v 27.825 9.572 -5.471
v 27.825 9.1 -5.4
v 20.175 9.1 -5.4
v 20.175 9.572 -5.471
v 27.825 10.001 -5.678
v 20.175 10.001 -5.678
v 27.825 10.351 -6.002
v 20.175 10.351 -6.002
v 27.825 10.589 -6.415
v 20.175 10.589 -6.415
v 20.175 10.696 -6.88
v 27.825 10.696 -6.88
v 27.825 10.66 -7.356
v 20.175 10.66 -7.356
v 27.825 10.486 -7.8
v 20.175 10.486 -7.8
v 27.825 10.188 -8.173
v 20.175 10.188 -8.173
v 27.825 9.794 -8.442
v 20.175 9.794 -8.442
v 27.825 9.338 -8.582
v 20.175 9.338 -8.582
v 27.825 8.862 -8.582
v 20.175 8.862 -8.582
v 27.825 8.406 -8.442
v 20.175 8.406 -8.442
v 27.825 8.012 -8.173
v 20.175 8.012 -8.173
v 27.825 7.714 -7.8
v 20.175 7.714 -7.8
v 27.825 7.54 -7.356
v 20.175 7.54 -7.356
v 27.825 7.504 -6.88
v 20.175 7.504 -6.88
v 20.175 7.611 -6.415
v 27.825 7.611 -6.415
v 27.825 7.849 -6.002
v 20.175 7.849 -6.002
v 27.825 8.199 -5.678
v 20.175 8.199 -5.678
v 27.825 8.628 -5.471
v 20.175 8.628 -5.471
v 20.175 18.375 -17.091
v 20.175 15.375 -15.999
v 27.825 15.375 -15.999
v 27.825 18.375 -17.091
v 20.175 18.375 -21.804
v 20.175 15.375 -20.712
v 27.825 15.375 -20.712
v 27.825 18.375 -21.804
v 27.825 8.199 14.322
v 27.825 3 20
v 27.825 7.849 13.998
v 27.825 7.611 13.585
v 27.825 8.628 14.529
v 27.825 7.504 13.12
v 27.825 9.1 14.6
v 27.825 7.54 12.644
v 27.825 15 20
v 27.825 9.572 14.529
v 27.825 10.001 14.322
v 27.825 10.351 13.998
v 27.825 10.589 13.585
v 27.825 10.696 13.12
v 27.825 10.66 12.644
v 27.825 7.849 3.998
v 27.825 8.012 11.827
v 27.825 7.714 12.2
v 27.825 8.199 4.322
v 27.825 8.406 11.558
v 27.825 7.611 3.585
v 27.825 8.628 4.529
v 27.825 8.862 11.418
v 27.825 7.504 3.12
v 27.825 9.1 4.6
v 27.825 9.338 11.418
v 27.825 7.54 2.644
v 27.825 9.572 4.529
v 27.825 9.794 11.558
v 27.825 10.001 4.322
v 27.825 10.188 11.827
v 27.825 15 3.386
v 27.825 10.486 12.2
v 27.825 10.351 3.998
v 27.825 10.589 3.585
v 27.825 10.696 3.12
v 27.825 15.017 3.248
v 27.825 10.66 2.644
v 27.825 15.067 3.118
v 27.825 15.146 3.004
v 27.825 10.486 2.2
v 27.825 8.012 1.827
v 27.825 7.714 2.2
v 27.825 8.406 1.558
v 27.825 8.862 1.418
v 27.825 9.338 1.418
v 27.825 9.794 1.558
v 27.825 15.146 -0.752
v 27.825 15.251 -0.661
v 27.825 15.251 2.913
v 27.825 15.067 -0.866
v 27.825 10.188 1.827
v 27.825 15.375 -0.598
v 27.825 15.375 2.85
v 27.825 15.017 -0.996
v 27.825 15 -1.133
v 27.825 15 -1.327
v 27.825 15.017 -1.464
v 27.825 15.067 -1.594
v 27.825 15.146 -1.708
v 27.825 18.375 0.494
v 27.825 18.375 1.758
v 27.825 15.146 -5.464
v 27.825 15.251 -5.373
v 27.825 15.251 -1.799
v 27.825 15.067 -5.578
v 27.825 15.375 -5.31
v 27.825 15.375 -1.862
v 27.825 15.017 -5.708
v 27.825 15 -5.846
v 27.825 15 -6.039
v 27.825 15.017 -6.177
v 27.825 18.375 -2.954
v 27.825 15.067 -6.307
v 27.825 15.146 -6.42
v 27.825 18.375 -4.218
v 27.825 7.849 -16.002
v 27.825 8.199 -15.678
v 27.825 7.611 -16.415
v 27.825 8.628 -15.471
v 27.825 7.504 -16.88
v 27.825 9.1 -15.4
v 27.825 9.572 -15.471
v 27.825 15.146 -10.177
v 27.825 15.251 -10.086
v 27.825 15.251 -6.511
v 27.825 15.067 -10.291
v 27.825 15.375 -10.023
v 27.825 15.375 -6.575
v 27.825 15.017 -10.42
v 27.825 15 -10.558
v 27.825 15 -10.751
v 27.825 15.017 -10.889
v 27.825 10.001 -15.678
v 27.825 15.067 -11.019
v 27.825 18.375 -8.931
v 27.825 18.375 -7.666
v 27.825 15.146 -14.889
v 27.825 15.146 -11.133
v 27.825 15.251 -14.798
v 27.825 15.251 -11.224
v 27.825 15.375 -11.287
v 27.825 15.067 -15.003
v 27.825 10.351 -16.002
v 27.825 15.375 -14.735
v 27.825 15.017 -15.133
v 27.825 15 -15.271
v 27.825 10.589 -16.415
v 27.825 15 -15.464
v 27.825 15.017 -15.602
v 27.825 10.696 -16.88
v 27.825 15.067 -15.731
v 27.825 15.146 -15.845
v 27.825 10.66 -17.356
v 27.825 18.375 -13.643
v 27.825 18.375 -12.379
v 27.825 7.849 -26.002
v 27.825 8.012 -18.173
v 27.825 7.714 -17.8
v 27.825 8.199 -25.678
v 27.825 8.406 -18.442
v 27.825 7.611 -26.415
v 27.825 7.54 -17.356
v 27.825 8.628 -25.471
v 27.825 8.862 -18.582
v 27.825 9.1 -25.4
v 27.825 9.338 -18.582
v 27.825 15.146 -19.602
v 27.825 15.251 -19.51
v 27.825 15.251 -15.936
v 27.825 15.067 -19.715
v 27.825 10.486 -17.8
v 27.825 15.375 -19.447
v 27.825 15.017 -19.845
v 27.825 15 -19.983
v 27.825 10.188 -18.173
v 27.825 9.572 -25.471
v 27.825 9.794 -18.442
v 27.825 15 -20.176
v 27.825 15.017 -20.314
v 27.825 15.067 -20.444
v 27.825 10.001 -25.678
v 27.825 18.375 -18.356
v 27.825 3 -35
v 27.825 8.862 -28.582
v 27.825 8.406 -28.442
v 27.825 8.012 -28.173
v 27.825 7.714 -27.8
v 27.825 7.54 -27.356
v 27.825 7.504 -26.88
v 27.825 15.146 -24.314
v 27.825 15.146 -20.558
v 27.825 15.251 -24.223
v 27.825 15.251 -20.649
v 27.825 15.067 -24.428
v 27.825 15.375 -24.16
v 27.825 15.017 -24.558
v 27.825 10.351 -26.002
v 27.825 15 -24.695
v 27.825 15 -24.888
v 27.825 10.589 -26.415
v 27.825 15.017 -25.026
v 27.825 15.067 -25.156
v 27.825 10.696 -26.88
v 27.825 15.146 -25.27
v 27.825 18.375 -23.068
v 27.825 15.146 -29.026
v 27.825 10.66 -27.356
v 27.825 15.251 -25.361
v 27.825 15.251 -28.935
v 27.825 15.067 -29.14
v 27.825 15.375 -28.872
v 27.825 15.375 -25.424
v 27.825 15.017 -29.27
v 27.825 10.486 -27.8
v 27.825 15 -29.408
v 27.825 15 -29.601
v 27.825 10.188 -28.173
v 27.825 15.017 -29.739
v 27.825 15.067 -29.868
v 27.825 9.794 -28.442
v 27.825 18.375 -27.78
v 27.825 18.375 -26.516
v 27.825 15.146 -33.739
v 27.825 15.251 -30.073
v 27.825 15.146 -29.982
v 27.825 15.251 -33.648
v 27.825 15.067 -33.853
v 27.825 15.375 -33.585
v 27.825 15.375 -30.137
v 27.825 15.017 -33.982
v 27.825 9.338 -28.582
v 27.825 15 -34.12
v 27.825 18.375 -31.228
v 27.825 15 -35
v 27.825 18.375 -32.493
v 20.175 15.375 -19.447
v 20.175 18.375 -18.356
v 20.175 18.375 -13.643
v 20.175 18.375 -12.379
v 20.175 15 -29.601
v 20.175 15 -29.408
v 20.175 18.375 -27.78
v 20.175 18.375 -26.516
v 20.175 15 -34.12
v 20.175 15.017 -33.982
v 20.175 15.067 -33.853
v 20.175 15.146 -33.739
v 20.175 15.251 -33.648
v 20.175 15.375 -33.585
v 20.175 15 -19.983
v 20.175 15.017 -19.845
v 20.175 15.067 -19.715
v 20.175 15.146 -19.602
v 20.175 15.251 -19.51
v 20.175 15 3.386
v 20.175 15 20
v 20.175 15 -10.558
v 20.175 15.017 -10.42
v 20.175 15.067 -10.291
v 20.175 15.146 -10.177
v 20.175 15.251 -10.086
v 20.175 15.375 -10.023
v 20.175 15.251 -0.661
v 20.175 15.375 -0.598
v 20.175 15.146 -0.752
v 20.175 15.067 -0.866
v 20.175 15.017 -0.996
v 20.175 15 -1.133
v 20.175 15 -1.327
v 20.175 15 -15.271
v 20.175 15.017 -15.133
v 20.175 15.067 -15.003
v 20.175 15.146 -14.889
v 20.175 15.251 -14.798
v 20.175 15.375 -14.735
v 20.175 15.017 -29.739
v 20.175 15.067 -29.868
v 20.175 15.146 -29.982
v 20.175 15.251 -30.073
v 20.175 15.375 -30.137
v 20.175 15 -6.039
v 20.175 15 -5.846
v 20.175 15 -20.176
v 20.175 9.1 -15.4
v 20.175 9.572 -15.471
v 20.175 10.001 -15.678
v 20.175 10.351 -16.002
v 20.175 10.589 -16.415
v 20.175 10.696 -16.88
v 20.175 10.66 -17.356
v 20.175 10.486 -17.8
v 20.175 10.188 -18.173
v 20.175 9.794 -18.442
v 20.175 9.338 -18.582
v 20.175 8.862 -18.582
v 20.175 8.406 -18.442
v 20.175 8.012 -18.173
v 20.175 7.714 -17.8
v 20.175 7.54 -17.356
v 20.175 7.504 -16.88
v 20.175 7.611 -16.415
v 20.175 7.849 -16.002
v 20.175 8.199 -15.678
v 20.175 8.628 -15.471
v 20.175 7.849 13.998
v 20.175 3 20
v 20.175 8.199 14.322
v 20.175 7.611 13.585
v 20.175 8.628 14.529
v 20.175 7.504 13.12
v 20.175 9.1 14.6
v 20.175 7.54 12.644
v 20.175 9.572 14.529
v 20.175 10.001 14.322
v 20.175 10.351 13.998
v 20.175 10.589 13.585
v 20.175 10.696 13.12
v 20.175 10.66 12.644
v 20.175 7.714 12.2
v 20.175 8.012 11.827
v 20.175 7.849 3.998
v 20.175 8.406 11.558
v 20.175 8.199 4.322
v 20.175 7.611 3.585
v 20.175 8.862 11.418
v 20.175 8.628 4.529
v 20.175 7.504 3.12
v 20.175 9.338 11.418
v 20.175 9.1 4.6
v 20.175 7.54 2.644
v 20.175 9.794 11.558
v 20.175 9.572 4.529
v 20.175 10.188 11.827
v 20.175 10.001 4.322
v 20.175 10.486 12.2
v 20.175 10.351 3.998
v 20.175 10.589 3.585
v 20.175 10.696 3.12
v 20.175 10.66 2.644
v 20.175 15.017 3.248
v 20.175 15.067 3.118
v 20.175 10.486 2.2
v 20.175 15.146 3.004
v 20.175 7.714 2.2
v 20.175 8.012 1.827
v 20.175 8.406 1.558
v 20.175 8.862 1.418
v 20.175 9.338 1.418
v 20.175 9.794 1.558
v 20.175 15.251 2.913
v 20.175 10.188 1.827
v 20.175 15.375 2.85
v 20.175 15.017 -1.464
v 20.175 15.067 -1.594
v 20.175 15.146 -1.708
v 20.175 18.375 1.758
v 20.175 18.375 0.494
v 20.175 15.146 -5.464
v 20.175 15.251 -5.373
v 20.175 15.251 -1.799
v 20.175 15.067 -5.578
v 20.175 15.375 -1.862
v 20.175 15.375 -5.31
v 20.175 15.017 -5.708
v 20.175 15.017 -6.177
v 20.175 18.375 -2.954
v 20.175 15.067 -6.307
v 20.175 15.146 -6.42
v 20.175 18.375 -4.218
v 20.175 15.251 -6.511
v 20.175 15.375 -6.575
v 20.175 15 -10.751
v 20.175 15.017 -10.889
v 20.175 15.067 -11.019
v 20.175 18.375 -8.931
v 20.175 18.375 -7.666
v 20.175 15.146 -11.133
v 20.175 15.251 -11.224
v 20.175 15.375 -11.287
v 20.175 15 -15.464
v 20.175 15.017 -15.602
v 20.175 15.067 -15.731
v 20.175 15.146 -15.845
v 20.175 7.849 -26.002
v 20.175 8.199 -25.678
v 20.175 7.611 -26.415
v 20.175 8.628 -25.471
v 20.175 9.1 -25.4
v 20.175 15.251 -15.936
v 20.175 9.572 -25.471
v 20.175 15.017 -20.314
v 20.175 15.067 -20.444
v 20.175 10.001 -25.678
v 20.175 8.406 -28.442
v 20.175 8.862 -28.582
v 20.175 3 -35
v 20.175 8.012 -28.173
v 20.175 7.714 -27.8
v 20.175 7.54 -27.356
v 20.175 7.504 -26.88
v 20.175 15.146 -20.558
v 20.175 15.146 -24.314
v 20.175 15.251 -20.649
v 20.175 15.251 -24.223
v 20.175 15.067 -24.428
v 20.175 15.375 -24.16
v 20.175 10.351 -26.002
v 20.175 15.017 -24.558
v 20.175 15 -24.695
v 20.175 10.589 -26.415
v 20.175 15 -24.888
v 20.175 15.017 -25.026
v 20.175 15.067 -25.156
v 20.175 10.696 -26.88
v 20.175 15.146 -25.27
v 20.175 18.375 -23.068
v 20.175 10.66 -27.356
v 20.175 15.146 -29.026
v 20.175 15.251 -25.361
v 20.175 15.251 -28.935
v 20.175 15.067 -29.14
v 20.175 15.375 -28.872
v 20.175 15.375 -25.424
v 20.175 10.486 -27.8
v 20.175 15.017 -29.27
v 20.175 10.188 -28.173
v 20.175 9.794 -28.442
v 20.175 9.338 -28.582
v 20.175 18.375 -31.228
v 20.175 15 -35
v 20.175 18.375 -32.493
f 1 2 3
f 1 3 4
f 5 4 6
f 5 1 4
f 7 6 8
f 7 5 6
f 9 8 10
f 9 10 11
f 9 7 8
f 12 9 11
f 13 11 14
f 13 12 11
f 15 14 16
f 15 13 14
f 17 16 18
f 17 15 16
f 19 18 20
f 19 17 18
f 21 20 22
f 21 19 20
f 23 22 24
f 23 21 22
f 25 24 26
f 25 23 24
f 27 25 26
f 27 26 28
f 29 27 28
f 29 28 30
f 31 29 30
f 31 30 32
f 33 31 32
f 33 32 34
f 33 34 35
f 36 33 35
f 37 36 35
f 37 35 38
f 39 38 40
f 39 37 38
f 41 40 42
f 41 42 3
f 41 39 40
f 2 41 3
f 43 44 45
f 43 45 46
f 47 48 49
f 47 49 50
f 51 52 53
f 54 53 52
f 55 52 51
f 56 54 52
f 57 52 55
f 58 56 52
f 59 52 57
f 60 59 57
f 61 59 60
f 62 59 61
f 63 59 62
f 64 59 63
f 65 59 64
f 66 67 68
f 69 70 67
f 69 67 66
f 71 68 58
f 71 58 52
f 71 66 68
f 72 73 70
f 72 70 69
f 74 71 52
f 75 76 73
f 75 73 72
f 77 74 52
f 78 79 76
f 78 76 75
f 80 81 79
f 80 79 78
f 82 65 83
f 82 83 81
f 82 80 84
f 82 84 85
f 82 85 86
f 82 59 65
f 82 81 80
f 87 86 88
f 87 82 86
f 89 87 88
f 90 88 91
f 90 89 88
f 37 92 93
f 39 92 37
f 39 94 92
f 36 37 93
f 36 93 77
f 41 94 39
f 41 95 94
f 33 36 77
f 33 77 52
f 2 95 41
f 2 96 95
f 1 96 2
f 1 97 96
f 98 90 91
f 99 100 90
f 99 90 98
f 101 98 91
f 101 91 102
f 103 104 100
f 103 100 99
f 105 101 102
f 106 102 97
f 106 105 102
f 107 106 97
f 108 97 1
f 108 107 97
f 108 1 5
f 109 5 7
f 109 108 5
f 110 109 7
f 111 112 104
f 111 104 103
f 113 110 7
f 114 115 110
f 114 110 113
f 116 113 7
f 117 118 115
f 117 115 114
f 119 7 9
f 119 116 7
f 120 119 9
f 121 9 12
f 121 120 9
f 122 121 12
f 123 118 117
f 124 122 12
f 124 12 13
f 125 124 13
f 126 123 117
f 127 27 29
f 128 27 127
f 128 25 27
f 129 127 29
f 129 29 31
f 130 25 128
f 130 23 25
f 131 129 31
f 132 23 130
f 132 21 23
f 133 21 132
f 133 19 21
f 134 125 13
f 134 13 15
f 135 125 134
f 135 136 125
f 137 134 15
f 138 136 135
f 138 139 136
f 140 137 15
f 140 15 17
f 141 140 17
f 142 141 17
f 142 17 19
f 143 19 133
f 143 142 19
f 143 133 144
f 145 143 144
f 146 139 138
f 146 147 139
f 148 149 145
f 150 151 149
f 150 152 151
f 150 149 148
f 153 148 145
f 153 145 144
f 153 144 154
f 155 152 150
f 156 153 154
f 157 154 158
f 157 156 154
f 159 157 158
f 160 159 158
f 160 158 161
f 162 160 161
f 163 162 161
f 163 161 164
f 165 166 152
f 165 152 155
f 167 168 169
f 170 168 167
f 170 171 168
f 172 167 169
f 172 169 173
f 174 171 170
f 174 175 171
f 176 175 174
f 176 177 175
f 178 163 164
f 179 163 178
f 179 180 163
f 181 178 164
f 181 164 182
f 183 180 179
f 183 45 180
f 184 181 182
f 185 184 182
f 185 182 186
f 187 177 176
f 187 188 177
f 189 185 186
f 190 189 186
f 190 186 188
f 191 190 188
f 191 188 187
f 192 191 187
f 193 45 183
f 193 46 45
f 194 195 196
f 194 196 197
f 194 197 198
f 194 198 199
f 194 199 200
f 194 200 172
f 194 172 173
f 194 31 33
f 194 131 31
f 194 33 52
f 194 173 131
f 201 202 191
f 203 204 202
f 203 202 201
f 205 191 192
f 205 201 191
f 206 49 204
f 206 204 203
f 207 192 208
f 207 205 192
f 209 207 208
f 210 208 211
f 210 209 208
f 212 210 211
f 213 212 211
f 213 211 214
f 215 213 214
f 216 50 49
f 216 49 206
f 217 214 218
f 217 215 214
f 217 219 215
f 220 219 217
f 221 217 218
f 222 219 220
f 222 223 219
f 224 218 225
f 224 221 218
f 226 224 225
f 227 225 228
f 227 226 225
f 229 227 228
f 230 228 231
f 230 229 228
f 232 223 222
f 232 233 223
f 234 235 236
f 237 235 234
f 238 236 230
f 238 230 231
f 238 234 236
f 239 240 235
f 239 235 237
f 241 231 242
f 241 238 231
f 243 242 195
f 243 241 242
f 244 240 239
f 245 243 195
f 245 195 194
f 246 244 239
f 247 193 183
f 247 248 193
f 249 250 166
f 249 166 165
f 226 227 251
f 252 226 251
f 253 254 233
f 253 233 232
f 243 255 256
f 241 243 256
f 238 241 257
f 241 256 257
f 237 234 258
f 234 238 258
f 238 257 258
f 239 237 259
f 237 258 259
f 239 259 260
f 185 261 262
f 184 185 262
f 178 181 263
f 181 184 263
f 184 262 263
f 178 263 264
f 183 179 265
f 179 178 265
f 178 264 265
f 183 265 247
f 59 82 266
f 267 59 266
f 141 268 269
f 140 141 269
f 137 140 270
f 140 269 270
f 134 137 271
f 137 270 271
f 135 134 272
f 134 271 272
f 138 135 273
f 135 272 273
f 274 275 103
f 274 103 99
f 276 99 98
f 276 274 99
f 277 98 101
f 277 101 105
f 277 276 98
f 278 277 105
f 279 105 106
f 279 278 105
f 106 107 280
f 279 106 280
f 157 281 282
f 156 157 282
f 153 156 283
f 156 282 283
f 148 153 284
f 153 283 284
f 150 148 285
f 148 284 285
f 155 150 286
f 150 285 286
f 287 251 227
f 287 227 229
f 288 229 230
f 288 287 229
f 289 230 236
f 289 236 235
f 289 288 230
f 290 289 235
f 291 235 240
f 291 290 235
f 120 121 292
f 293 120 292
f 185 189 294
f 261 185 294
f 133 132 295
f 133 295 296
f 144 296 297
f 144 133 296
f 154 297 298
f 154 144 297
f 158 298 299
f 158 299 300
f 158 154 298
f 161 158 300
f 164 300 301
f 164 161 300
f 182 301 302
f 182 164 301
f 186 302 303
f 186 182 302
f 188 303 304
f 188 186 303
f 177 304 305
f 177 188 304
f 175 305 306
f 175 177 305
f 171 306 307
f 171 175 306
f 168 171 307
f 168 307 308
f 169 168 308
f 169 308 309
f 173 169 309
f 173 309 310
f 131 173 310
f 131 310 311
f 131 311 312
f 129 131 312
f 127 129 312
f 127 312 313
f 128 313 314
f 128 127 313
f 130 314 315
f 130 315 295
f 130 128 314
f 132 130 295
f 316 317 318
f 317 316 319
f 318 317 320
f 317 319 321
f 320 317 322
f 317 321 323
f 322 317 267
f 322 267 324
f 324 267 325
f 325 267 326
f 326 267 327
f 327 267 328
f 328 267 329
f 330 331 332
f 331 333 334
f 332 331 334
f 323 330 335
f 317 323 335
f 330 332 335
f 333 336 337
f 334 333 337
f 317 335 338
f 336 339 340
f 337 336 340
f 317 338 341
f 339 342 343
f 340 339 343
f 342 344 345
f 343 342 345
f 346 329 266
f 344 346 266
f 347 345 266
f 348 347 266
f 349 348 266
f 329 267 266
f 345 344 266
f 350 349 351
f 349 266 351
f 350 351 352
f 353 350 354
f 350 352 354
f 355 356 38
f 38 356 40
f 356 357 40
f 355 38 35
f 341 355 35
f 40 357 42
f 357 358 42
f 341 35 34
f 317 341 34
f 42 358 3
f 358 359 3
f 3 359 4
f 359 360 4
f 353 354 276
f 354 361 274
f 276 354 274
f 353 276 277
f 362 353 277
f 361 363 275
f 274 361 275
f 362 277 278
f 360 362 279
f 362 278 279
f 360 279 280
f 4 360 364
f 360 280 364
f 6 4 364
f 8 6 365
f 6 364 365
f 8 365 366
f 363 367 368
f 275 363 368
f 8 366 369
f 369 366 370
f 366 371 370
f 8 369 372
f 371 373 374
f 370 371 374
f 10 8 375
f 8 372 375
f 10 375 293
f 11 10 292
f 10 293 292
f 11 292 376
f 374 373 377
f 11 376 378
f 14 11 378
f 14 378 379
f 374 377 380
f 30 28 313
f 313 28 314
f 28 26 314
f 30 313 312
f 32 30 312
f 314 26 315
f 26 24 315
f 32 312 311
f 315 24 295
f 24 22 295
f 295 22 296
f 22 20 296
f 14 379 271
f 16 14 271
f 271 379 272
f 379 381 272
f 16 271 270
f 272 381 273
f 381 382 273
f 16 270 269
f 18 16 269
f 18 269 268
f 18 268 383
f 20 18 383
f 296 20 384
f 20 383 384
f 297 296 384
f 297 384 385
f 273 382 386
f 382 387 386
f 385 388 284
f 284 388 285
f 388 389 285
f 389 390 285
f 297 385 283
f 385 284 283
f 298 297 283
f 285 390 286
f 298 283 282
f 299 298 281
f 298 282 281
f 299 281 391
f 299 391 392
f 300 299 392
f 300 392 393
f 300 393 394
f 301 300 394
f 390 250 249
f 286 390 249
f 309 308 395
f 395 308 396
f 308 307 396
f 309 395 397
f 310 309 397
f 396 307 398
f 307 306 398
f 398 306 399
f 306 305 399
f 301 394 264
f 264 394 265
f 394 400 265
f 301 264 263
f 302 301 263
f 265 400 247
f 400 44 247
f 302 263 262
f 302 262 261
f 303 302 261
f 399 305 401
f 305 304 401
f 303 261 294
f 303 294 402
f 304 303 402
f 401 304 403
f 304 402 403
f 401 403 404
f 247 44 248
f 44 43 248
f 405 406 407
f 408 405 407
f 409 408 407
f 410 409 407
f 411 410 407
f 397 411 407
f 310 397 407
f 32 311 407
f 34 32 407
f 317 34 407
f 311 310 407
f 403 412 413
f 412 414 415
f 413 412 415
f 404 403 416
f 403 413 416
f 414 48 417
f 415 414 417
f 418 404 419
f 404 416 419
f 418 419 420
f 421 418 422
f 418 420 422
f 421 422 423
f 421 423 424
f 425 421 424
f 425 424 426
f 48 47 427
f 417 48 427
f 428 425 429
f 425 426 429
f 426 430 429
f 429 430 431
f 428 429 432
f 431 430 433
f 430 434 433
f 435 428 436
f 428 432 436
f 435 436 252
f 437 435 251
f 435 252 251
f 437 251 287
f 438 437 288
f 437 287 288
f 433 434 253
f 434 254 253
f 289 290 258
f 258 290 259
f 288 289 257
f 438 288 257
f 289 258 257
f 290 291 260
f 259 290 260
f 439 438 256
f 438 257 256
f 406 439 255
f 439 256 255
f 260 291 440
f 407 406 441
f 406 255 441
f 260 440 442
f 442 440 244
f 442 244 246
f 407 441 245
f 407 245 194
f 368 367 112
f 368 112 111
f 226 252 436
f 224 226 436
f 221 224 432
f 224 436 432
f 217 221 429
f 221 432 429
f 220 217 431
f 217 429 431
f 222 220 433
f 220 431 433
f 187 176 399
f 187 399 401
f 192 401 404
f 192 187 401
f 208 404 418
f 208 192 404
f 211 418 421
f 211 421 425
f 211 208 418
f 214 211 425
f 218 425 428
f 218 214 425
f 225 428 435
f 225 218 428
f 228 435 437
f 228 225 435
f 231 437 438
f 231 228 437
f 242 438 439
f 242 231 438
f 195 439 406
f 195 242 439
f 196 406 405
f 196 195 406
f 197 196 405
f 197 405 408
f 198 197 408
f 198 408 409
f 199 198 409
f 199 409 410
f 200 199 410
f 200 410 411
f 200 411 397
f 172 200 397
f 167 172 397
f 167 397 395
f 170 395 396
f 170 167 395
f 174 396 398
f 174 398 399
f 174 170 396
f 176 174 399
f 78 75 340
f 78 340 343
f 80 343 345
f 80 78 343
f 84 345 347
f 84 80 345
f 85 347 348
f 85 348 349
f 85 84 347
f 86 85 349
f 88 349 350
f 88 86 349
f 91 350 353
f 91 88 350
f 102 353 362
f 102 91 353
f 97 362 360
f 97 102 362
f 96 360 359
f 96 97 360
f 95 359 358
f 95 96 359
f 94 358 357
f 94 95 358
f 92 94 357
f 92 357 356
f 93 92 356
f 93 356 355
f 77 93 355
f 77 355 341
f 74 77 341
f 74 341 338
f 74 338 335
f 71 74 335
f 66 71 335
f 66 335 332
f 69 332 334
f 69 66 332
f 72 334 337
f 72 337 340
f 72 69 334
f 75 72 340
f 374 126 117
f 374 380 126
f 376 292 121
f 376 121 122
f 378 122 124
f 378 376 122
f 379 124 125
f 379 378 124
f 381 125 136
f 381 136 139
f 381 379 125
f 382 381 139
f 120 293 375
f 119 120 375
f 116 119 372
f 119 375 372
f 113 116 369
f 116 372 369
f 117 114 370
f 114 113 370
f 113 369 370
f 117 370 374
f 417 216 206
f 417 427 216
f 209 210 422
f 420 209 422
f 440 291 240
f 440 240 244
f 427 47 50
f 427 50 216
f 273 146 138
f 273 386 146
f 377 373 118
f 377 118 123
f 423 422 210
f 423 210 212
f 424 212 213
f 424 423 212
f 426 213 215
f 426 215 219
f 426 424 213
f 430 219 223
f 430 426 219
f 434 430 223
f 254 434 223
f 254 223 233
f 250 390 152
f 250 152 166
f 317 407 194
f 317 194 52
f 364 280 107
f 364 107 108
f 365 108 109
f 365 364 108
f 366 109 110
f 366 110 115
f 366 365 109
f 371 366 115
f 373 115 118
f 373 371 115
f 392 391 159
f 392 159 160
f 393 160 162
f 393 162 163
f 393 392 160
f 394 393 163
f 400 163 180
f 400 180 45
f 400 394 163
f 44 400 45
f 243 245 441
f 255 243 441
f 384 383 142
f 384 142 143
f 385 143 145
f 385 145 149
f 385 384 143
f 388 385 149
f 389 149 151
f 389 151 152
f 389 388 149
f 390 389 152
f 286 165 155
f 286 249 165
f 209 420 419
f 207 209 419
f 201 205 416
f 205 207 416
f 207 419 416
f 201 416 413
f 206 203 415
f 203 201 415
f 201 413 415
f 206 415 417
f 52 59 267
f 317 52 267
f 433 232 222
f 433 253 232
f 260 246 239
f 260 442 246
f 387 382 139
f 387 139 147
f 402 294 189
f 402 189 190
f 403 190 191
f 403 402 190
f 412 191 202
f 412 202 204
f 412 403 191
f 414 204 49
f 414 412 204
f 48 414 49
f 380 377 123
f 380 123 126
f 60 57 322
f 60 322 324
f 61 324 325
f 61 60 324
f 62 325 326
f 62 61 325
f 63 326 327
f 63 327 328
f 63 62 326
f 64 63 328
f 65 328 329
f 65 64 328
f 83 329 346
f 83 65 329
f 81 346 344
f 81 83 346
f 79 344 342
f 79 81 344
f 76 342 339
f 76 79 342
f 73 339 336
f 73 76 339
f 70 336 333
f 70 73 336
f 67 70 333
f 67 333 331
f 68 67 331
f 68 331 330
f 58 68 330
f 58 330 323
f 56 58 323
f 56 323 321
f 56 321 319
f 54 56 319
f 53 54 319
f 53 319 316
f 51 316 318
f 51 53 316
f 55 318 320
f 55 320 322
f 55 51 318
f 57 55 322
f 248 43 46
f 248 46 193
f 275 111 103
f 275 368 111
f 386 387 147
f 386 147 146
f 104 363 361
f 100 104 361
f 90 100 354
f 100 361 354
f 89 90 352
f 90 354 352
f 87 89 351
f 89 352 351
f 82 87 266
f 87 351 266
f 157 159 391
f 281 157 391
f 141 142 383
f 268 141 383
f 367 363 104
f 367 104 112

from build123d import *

# Parameters (mm, degrees)
ESQUISSE1_W                 = 24
ESQUISSE1_H                 = 30
MAIN_EXTRUSION_DEPTH        = 30
MAIN_RIDING_HOLE_DEPTH      = 36.623026261
ESQUISSE4_R                 = 2.25
TRACTORHOLE_DEPTH           = 8
IMPACTPIECE_DEPTH           = 4.5
CONG_1_R                    = 3
TEETH_DEPTH                 = 4.5
CONG_3_R                    = 0.57
TEETHREPETITION_COUNT       = 8
TEETHREPETITION_PITCH       = 4.71238898
CONG_3_OF_TEETHREPETITION_R = 0.57
ESQUISSE9_W                 = 55
ESQUISSE9_H                 = 15.375
BRACKET_DEPTH               = 0.675
ESQUISSE10_R                = 1.6
BRACKETHOLE_DEPTH           = 60.348546739
BRACKETHOLEREPETITION_COUNT = 5
BRACKETHOLEREPETITION_PITCH = 10
ESQUISSE11_W                = 7.5
ESQUISSE11_H                = 5.5
ESQUISSE11_H_2              = 7.6
RAILHOLE_DEPTH              = 20
TOPIMPACTCUT_DEPTH          = 60.348546739
ESQUISSE13_W                = 24
ESQUISSE13_H                = 50
MAKERBEAMMAINHOLE_DEPTH     = 95.451045521
KEEPONLYTRACTOR1_DEPTH      = 77.295478241
SKETCH2_W                   = 20
SKETCH2_H                   = 5.6
KEEPONLYTRACTOR2_DEPTH      = 41.263670039


with BuildPart() as part:
    # Esquisse1 → Main Extrusion (new body)
    with BuildSketch(Plane.XY):
        Rectangle(ESQUISSE1_W, ESQUISSE1_H)
    extrude(amount=MAIN_EXTRUSION_DEPTH)

    # Esquisse3 → Main Riding Hole (cut, through all)
    with BuildSketch(Plane(origin=(0, 0, 0), x_dir=(-1, 0, 0), z_dir=(0, 0, -1))):
        Polygon((-5.2, -1.6), (-5.2, -5.4), (-4.2, -5.4), (-4.2, -8.2), (-5.2, -8.2), (-5.2, -12), (-1.4, -12), (-1.4, -11), (1.4, -11), (1.4, -12), (5.2, -12), (5.2, -8.2), (4.2, -8.2), (4.2, -5.4), (5.2, -5.4), (5.2, -1.6), (1.4, -1.6), (1.4, -2.6), (-1.4, -2.6), (-1.4, -1.6), align=None)
    extrude(amount=-MAIN_RIDING_HOLE_DEPTH, mode=Mode.SUBTRACT)

    # Esquisse4 → TractorHole (cut)
    with BuildSketch(Plane.ZY.offset(12)):
        with Locations(Location((5, -6.8, 0), (0, 0, 270))):
            Circle(ESQUISSE4_R)
    tractorhole = extrude(amount=-TRACTORHOLE_DEPTH, mode=Mode.SUBTRACT)

    # TractorHoleSymetry: TractorHole across plane
    add(tractorhole.mirror(Plane(origin=(0, 0, 0), x_dir=(0, 0, 1), z_dir=(1, 0, 0))), mode=Mode.SUBTRACT)

    # Esquisse5 → ImpactPiece (add, symmetric)
    with BuildSketch(Plane(origin=(0, 0, 0), x_dir=(0, 0, -1), z_dir=(1, 0, 0))):
        Polygon((-45, 5), (-45, 35), (-25, 35), (-21.473460386, 15), (35, 15), (35, 3), (0, 3), (0, 5), align=None)
    extrude(amount=IMPACTPIECE_DEPTH, both=True)

    # Congé1
    cong_1_edges = [part.edges().sort_by_distance(p)[0] for p in [
        (4.5, 15, 25.736730193),
        (-4.5, 15, 25.736730193),
    ]]
    fillet(cong_1_edges, radius=CONG_1_R)

    # Esquisse8 → Teeth (add, symmetric)
    with BuildSketch(Plane(origin=(0, 0, 0), x_dir=(0, 0, -1), z_dir=(1, 0, 0))):
        Polygon((30, 15), (31.228399541, 18.375), (32.492683328, 18.375), (33.721082869, 15), align=None)
    teeth = extrude(amount=TEETH_DEPTH, both=True)

    # Congé3
    cong_3_edges = [part.edges().sort_by_distance(p)[0] for p in [
        (0, 15, -30),
        (0, 15, -33.721082869),
    ]]
    fillet(cong_3_edges, radius=CONG_3_R)

    # TeethRepetition: Teeth ×8
    with Locations(*[(0, 0, i * TEETHREPETITION_PITCH) for i in range(1, TEETHREPETITION_COUNT)]):
        add(teeth)

    # Congé3 of TeethRepetition
    cong_3_of_teethrepetition_edges = [part.edges().sort_by_distance(p)[0] for p in [
        (0, 15, -25.28761102),
        (0, 15, -29.008693889),
        (0, 15, -20.57522204),
        (0, 15, -24.296304909),
        (0, 15, -15.86283306),
        (0, 15, -19.583915929),
        (0, 15, -11.15044408),
        (0, 15, -14.871526949),
        (0, 15, -6.4380551),
        (0, 15, -10.159137969),
        (0, 15, -1.72566612),
        (0, 15, -5.446748989),
        (0, 15, 2.98672286),
        (0, 15, -0.734360009),
    ]]
    fillet(cong_3_of_teethrepetition_edges, radius=CONG_3_OF_TEETHREPETITION_R)

    # Esquisse9 → Bracket (cut, symmetric)
    with BuildSketch(Plane(origin=(4.5, 0, 0), x_dir=(0, 0, -1), z_dir=(1, 0, 0))):
        with Locations((7.5, 10.6875)):
            Rectangle(ESQUISSE9_W, ESQUISSE9_H)
    bracket = extrude(amount=BRACKET_DEPTH, both=True, mode=Mode.SUBTRACT)

    # Esquisse10 → BracketHole (cut, symmetric)
    with BuildSketch(Plane.ZY.offset(-4.5)):
        with Locations((-27, 9.1)):
            Circle(ESQUISSE10_R)
    brackethole = extrude(amount=BRACKETHOLE_DEPTH, both=True, mode=Mode.SUBTRACT)

    # BracketHoleRepetition: BracketHole ×5
    with Locations(*[(0, 0, i * BRACKETHOLEREPETITION_PITCH) for i in range(1, BRACKETHOLEREPETITION_COUNT)]):
        add(brackethole, mode=Mode.SUBTRACT)

    # Symétrie1: Bracket across plane
    add(bracket.mirror(Plane(origin=(0, 0, 0), x_dir=(0, 0, 1), z_dir=(1, 0, 0))), mode=Mode.SUBTRACT)

    # Esquisse11 → RailHole (cut)
    with BuildSketch(Plane(origin=(0, 0, 0), x_dir=(-1, 0, 0), z_dir=(0, 0, -1))):
        with Locations((8.25, 3.15)):
            Rectangle(ESQUISSE11_W, ESQUISSE11_H)
        with Locations((8.25, 16.2)):
            Rectangle(ESQUISSE11_W, ESQUISSE11_H_2)
    extrude(amount=-RAILHOLE_DEPTH, mode=Mode.SUBTRACT)

    # Esquisse12 → TopImpactCut (cut, through all)
    with BuildSketch(Plane(origin=(4.5, 0, 0), x_dir=(0, 0, -1), z_dir=(1, 0, 0))):
        Polygon((-45, 30), (-40, 35), (-45, 35), align=None)
    extrude(amount=-TOPIMPACTCUT_DEPTH, mode=Mode.SUBTRACT)


with BuildPart() as body_2:
    # Symétrie2: mirrored copy
    add(part.part.mirror(Plane(origin=(12, 15, 30), x_dir=(0, 0, 1), z_dir=(-1, 0, 0))))

    # Sketch1 → KeepOnlyTractor1 (cut, through all)
    with BuildSketch(Plane(origin=(0, 35, 0), x_dir=(1, 0, 0), z_dir=(0, 1, 0))):
        Polygon((12, 0), (12, -45), (36, -45), (36, 0), (27.825, 0.05190699), (27.825, -20), (20.175, -20), (20.175, 0), align=None)
    extrude(amount=-KEEPONLYTRACTOR1_DEPTH, mode=Mode.SUBTRACT)


with BuildPart() as part_1:
    add(part.part)

    # Esquisse13 → MakerBeamMainHole (cut, through all)
    with BuildSketch(Plane(origin=(0, 0, -35), x_dir=(-1, 0, 0), z_dir=(0, 0, -1))):
        with Locations((0, 10)):
            Rectangle(ESQUISSE13_W, ESQUISSE13_H)
    extrude(amount=-MAKERBEAMMAINHOLE_DEPTH, mode=Mode.SUBTRACT)


with BuildPart() as keeponlytractor1_kept_piece:
    # of the separate pieces the step leaves, the one the design keeps (keeponlytractor1_pieces_kept)
    add(body_2.part.solids().sort_by_distance((27.825, 15, 3.385841157))[0])

    # Sketch2 → KeepOnlyTractor2 (cut, through all)
    with BuildSketch(Plane.ZY.offset(-20.175)):
        with Locations((10, 0.2)):
            Rectangle(SKETCH2_W, SKETCH2_H)
    extrude(amount=-KEEPONLYTRACTOR2_DEPTH, mode=Mode.SUBTRACT)


solid = keeponlytractor1_kept_piece.part
